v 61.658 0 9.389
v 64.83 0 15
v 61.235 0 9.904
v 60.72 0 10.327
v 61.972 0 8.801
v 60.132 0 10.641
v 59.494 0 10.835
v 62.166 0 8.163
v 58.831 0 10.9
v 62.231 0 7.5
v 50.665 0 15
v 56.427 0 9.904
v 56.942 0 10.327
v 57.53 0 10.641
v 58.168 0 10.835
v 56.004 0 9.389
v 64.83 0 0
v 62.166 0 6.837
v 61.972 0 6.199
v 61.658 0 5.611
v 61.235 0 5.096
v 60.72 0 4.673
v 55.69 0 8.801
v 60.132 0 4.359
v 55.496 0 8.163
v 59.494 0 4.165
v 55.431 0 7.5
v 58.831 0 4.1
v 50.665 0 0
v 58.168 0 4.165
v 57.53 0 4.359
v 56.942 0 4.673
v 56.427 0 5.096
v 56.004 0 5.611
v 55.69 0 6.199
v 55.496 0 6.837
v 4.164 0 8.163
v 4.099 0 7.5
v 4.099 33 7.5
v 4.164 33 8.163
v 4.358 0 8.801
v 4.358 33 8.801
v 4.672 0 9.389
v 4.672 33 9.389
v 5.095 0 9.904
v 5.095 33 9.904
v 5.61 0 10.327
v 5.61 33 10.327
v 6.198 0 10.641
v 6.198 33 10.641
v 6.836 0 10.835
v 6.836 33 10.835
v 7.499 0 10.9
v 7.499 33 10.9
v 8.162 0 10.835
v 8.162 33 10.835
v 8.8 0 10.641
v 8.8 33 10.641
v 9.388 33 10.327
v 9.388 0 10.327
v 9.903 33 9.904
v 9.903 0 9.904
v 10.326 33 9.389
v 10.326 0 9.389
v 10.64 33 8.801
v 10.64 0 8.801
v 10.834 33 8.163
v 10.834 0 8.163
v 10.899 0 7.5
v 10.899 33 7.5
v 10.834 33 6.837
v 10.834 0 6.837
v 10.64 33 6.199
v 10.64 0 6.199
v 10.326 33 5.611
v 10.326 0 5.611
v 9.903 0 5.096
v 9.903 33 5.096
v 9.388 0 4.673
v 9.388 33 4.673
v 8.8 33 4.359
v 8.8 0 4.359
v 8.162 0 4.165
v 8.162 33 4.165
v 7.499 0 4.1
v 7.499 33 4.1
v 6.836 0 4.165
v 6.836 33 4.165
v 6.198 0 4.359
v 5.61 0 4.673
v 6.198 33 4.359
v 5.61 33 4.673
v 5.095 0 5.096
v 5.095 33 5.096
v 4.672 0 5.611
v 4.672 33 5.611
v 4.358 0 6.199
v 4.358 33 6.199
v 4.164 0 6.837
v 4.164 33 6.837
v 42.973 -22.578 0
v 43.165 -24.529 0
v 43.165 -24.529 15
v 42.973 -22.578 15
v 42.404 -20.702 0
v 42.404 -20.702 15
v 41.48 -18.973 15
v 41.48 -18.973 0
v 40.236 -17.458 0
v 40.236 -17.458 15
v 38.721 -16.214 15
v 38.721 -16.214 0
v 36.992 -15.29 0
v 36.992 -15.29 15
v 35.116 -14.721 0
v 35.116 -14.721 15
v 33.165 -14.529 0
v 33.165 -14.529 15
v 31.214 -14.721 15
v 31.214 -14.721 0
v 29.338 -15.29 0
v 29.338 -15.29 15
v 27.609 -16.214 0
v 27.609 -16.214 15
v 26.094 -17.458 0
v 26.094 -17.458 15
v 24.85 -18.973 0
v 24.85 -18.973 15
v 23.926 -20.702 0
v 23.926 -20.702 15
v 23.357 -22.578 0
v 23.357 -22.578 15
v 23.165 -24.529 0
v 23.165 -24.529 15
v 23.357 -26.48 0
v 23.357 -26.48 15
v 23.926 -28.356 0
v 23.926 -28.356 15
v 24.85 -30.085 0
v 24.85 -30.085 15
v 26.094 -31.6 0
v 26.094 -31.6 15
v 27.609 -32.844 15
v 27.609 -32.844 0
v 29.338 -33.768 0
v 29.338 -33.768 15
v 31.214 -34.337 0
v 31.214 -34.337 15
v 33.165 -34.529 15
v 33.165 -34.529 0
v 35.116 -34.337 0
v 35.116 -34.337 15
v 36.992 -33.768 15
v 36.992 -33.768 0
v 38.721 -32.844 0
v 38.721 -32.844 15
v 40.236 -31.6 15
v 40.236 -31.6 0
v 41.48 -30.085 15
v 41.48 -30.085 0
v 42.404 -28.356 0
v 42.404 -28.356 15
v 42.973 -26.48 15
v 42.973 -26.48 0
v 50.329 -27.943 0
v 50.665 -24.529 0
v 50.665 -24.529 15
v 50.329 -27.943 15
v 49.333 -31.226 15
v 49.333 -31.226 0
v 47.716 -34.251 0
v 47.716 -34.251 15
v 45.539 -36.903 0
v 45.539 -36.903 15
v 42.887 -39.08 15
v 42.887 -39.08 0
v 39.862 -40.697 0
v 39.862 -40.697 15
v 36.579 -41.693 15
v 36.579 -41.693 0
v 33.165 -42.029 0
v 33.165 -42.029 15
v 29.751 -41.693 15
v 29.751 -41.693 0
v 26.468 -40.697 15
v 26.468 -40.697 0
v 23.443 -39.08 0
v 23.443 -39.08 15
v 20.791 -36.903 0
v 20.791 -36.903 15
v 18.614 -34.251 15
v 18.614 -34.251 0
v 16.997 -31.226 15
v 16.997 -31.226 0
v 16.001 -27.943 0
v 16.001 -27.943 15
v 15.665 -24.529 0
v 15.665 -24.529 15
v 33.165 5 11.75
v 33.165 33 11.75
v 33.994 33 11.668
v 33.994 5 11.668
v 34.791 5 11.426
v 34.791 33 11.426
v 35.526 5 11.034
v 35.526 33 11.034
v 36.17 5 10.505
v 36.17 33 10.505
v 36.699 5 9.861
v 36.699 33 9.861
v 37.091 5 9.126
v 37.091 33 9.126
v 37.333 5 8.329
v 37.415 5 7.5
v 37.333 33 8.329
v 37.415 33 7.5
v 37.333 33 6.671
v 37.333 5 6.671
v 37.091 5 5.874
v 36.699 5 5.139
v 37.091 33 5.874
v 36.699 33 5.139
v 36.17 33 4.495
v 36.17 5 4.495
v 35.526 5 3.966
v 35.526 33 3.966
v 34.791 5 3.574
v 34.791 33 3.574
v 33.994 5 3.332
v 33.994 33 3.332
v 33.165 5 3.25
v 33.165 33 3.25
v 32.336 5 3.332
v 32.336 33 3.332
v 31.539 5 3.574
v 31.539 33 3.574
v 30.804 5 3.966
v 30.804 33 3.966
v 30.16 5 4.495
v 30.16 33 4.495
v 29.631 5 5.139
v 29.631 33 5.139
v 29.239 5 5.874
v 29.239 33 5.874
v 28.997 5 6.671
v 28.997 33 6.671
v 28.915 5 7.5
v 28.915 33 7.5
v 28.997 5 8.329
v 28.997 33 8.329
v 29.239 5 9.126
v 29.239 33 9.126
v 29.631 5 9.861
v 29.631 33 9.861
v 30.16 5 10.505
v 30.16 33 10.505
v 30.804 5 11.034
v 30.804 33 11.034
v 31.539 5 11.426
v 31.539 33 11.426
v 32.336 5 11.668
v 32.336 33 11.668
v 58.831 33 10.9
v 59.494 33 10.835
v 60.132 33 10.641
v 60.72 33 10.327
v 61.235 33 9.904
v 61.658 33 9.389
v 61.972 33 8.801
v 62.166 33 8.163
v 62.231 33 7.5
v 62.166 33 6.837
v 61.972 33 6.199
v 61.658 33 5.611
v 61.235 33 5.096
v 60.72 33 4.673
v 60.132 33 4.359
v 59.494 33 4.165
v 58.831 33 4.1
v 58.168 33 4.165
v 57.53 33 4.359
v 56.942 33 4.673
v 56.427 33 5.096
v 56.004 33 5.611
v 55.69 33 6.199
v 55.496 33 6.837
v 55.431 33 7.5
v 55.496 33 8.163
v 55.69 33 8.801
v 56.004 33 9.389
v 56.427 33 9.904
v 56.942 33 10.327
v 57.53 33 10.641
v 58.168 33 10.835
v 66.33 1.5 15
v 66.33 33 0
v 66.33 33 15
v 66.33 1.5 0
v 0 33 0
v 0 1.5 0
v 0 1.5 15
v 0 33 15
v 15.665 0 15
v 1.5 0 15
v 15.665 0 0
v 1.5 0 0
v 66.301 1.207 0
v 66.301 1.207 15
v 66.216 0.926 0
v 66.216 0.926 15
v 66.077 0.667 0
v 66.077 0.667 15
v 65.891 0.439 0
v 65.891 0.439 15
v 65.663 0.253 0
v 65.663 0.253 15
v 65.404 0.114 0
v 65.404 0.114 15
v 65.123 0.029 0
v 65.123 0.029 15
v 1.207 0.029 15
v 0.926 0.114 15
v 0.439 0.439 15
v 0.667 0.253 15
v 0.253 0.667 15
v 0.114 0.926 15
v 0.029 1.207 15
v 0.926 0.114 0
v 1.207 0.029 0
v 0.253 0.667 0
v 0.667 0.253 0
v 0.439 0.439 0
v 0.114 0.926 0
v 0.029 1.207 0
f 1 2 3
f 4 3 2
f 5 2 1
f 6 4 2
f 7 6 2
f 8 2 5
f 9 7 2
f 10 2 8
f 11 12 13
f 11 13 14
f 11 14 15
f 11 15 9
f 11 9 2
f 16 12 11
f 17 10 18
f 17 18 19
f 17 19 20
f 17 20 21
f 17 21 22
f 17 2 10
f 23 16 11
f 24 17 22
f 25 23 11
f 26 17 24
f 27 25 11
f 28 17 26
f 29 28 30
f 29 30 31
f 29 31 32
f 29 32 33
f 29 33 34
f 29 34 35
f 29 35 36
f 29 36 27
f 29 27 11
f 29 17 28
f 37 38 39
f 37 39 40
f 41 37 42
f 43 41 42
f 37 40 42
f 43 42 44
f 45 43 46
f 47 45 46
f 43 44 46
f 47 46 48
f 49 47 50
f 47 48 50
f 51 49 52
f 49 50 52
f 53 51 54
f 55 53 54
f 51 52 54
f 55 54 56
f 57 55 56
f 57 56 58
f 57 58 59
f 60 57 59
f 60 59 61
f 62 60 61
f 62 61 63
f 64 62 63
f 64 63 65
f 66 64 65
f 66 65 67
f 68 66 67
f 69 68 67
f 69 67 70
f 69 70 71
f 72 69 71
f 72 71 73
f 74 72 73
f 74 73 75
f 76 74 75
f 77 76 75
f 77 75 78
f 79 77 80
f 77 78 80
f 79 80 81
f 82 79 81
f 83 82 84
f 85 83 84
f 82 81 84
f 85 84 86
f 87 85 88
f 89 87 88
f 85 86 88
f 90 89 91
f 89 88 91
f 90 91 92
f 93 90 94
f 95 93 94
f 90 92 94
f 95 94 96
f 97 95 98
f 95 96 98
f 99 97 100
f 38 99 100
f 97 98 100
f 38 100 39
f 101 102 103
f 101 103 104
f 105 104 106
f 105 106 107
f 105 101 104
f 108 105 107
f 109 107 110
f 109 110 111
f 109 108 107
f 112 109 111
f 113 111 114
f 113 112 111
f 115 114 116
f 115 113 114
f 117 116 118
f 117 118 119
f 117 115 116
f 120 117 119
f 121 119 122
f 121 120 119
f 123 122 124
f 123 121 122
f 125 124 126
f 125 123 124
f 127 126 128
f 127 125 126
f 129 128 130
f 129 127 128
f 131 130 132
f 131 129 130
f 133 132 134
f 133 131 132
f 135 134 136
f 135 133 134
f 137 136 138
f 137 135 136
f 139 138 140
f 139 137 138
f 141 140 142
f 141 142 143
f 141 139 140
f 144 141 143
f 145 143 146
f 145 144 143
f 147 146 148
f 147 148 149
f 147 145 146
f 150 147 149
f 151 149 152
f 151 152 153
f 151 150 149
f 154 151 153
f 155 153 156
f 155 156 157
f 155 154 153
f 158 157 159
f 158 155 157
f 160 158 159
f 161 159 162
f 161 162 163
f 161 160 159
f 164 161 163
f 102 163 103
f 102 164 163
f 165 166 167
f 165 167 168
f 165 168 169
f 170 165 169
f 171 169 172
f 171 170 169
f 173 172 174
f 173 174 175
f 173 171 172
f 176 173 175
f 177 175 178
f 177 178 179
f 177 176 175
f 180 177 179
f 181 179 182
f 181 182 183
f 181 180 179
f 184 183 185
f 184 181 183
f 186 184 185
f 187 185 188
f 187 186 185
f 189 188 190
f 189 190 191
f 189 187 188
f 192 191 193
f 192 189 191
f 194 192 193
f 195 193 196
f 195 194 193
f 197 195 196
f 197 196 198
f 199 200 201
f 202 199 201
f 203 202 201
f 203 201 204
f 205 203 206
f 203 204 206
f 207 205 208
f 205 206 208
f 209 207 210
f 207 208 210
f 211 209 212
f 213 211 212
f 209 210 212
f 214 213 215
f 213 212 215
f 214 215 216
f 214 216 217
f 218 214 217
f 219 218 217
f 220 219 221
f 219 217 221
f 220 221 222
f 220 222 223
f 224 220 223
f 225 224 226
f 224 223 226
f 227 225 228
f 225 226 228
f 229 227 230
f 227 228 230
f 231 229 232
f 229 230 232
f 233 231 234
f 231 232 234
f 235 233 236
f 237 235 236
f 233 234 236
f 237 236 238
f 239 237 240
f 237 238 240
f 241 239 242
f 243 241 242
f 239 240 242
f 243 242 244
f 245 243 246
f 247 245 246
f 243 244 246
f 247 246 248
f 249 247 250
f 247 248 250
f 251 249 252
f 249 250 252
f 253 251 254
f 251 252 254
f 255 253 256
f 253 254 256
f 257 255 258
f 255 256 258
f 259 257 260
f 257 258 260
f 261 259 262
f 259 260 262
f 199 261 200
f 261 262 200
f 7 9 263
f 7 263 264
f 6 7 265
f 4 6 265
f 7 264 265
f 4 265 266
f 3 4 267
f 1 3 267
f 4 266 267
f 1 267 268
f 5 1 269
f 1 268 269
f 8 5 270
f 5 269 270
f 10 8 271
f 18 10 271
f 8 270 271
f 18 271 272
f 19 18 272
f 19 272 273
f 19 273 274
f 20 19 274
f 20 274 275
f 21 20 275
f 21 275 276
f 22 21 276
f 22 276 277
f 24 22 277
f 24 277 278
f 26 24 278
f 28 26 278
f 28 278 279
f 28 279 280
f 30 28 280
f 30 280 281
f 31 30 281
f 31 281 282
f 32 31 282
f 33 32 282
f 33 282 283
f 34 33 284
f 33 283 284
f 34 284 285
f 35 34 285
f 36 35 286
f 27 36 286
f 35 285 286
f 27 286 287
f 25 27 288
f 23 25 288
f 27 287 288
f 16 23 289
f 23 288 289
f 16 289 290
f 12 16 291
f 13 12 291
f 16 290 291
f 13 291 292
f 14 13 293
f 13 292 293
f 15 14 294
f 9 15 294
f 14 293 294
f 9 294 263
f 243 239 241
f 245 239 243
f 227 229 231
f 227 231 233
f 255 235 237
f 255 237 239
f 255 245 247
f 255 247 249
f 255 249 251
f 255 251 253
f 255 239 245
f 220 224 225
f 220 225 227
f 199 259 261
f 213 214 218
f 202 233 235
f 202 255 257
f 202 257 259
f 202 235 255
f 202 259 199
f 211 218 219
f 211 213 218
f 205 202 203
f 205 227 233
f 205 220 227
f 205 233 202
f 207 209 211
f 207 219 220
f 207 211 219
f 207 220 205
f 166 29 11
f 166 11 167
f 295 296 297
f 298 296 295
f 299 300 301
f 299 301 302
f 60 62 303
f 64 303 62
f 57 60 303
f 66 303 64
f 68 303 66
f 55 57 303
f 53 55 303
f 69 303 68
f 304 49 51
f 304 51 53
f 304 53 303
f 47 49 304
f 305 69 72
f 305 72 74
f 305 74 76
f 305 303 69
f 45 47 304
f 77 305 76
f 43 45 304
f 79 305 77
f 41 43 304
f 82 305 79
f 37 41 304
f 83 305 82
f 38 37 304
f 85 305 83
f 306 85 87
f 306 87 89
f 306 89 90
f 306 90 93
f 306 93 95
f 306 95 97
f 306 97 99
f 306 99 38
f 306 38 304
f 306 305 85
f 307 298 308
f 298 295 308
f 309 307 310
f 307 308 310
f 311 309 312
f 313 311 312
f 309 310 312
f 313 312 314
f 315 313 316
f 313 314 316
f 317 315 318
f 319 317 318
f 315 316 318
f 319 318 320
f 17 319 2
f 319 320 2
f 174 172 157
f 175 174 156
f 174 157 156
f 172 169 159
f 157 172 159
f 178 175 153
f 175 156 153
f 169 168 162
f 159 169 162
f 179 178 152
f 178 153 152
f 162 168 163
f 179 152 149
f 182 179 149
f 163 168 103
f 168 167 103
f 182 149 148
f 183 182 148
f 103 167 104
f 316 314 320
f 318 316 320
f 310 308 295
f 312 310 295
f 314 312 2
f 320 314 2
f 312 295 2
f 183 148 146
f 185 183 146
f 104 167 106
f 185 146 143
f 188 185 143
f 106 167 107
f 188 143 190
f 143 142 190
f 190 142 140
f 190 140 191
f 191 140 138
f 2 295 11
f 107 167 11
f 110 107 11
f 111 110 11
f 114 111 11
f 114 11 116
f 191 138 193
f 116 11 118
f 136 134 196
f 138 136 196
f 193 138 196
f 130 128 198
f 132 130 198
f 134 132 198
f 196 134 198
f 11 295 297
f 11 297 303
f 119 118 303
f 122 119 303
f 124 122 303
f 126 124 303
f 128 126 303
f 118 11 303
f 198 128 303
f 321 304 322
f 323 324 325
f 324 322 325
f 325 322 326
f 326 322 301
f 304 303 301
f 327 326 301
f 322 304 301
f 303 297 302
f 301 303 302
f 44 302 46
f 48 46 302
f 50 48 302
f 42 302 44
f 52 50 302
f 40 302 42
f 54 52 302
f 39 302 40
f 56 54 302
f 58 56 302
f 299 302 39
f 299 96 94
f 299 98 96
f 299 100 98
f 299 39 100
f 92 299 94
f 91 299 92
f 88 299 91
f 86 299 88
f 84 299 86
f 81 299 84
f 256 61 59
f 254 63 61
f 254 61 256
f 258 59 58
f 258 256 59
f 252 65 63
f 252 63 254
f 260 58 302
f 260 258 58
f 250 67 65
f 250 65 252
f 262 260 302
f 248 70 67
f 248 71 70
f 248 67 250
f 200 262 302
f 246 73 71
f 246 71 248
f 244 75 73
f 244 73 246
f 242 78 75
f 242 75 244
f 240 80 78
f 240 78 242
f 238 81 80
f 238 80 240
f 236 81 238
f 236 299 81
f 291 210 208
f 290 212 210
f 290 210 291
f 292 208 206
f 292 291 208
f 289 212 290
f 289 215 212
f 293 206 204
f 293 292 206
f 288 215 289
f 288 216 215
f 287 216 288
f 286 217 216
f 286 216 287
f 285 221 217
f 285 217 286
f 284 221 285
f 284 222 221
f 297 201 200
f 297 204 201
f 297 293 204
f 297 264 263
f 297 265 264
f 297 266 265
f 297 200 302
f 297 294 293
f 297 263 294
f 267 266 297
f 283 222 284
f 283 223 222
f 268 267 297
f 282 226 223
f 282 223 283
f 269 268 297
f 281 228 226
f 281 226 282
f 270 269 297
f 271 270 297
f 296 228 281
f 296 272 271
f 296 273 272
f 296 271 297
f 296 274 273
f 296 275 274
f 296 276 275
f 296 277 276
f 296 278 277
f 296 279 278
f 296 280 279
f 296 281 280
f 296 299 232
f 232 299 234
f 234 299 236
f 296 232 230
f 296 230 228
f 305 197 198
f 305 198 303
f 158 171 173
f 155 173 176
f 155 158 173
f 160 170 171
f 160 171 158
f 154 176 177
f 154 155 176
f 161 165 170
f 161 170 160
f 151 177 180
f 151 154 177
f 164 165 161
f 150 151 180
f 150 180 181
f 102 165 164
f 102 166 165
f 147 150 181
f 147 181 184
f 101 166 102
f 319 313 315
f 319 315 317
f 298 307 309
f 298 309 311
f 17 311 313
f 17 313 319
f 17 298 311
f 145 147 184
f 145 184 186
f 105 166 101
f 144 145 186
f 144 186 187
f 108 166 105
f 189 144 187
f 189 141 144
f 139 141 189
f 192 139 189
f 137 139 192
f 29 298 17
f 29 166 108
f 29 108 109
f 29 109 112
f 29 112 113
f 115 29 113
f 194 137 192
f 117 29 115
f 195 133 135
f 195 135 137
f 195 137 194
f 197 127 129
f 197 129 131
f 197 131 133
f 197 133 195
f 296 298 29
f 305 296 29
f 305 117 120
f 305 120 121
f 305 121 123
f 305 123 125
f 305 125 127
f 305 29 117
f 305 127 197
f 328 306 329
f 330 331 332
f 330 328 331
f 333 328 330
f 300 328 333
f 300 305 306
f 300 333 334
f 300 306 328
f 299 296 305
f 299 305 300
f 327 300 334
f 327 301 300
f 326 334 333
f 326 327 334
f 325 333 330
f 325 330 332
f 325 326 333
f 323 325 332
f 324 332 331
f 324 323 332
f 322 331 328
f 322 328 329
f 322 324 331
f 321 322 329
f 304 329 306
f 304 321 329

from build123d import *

# Parameters (mm, degrees)
SKETCH1_R           = 10
BOSS_EXTRUDE1_DEPTH = 15
SKETCH2_R           = 3.4
CUT_EXTRUDE1_DEPTH  = 54
SKETCH3_R           = 4.25
CUT_EXTRUDE2_DEPTH  = 28
FILLET1_R           = 1.5


with BuildPart() as part:
    # Sketch1 → Boss-Extrude1 (new body)
    with BuildSketch(Plane.XY):
        with BuildLine():
            Line((0, 0), (0, 33))
            Line((0, 33), (66.33, 33))
            Line((66.33, 33), (66.33, 0))
            Line((66.33, 0), (50.665, 0))
            Line((50.665, 0), (50.665, -24.529))
            ThreePointArc((50.665, -24.529), (33.165, -42.029), (15.665, -24.529))
            Line((15.665, -24.529), (15.665, 0))
            Line((15.665, 0), (0, 0))
        make_face()
        with Locations((33.165, -24.529)):
            Circle(SKETCH1_R, mode=Mode.SUBTRACT)
    extrude(amount=BOSS_EXTRUDE1_DEPTH)

    # Sketch2 → Cut-Extrude1 (cut)
    with BuildSketch(Plane(origin=(0, 33, 0), x_dir=(1, 0, 0), z_dir=(0, 1, 0))):
        with Locations(Location((58.831, -7.5, 0), (0, 0, 270))):
            Circle(SKETCH2_R)
        with Locations(Location((7.499, -7.5, 0), (0, 0, 180))):
            Circle(SKETCH2_R)
    extrude(amount=-CUT_EXTRUDE1_DEPTH, mode=Mode.SUBTRACT)

    # Sketch3 → Cut-Extrude2 (cut)
    with BuildSketch(Plane(origin=(0, 33, 0), x_dir=(1, 0, 0), z_dir=(0, 1, 0))):
        with Locations(Location((33.165, -7.5, 0), (0, 0, 270))):
            Circle(SKETCH3_R)
    extrude(amount=-CUT_EXTRUDE2_DEPTH, mode=Mode.SUBTRACT)

    # Fillet1
    fillet1_edges = [part.edges().sort_by_distance(p)[0] for p in [
        (0, 0, 7.5),
        (66.33, 0, 7.5),
    ]]
    fillet(fillet1_edges, radius=FILLET1_R)


solid = part.part
